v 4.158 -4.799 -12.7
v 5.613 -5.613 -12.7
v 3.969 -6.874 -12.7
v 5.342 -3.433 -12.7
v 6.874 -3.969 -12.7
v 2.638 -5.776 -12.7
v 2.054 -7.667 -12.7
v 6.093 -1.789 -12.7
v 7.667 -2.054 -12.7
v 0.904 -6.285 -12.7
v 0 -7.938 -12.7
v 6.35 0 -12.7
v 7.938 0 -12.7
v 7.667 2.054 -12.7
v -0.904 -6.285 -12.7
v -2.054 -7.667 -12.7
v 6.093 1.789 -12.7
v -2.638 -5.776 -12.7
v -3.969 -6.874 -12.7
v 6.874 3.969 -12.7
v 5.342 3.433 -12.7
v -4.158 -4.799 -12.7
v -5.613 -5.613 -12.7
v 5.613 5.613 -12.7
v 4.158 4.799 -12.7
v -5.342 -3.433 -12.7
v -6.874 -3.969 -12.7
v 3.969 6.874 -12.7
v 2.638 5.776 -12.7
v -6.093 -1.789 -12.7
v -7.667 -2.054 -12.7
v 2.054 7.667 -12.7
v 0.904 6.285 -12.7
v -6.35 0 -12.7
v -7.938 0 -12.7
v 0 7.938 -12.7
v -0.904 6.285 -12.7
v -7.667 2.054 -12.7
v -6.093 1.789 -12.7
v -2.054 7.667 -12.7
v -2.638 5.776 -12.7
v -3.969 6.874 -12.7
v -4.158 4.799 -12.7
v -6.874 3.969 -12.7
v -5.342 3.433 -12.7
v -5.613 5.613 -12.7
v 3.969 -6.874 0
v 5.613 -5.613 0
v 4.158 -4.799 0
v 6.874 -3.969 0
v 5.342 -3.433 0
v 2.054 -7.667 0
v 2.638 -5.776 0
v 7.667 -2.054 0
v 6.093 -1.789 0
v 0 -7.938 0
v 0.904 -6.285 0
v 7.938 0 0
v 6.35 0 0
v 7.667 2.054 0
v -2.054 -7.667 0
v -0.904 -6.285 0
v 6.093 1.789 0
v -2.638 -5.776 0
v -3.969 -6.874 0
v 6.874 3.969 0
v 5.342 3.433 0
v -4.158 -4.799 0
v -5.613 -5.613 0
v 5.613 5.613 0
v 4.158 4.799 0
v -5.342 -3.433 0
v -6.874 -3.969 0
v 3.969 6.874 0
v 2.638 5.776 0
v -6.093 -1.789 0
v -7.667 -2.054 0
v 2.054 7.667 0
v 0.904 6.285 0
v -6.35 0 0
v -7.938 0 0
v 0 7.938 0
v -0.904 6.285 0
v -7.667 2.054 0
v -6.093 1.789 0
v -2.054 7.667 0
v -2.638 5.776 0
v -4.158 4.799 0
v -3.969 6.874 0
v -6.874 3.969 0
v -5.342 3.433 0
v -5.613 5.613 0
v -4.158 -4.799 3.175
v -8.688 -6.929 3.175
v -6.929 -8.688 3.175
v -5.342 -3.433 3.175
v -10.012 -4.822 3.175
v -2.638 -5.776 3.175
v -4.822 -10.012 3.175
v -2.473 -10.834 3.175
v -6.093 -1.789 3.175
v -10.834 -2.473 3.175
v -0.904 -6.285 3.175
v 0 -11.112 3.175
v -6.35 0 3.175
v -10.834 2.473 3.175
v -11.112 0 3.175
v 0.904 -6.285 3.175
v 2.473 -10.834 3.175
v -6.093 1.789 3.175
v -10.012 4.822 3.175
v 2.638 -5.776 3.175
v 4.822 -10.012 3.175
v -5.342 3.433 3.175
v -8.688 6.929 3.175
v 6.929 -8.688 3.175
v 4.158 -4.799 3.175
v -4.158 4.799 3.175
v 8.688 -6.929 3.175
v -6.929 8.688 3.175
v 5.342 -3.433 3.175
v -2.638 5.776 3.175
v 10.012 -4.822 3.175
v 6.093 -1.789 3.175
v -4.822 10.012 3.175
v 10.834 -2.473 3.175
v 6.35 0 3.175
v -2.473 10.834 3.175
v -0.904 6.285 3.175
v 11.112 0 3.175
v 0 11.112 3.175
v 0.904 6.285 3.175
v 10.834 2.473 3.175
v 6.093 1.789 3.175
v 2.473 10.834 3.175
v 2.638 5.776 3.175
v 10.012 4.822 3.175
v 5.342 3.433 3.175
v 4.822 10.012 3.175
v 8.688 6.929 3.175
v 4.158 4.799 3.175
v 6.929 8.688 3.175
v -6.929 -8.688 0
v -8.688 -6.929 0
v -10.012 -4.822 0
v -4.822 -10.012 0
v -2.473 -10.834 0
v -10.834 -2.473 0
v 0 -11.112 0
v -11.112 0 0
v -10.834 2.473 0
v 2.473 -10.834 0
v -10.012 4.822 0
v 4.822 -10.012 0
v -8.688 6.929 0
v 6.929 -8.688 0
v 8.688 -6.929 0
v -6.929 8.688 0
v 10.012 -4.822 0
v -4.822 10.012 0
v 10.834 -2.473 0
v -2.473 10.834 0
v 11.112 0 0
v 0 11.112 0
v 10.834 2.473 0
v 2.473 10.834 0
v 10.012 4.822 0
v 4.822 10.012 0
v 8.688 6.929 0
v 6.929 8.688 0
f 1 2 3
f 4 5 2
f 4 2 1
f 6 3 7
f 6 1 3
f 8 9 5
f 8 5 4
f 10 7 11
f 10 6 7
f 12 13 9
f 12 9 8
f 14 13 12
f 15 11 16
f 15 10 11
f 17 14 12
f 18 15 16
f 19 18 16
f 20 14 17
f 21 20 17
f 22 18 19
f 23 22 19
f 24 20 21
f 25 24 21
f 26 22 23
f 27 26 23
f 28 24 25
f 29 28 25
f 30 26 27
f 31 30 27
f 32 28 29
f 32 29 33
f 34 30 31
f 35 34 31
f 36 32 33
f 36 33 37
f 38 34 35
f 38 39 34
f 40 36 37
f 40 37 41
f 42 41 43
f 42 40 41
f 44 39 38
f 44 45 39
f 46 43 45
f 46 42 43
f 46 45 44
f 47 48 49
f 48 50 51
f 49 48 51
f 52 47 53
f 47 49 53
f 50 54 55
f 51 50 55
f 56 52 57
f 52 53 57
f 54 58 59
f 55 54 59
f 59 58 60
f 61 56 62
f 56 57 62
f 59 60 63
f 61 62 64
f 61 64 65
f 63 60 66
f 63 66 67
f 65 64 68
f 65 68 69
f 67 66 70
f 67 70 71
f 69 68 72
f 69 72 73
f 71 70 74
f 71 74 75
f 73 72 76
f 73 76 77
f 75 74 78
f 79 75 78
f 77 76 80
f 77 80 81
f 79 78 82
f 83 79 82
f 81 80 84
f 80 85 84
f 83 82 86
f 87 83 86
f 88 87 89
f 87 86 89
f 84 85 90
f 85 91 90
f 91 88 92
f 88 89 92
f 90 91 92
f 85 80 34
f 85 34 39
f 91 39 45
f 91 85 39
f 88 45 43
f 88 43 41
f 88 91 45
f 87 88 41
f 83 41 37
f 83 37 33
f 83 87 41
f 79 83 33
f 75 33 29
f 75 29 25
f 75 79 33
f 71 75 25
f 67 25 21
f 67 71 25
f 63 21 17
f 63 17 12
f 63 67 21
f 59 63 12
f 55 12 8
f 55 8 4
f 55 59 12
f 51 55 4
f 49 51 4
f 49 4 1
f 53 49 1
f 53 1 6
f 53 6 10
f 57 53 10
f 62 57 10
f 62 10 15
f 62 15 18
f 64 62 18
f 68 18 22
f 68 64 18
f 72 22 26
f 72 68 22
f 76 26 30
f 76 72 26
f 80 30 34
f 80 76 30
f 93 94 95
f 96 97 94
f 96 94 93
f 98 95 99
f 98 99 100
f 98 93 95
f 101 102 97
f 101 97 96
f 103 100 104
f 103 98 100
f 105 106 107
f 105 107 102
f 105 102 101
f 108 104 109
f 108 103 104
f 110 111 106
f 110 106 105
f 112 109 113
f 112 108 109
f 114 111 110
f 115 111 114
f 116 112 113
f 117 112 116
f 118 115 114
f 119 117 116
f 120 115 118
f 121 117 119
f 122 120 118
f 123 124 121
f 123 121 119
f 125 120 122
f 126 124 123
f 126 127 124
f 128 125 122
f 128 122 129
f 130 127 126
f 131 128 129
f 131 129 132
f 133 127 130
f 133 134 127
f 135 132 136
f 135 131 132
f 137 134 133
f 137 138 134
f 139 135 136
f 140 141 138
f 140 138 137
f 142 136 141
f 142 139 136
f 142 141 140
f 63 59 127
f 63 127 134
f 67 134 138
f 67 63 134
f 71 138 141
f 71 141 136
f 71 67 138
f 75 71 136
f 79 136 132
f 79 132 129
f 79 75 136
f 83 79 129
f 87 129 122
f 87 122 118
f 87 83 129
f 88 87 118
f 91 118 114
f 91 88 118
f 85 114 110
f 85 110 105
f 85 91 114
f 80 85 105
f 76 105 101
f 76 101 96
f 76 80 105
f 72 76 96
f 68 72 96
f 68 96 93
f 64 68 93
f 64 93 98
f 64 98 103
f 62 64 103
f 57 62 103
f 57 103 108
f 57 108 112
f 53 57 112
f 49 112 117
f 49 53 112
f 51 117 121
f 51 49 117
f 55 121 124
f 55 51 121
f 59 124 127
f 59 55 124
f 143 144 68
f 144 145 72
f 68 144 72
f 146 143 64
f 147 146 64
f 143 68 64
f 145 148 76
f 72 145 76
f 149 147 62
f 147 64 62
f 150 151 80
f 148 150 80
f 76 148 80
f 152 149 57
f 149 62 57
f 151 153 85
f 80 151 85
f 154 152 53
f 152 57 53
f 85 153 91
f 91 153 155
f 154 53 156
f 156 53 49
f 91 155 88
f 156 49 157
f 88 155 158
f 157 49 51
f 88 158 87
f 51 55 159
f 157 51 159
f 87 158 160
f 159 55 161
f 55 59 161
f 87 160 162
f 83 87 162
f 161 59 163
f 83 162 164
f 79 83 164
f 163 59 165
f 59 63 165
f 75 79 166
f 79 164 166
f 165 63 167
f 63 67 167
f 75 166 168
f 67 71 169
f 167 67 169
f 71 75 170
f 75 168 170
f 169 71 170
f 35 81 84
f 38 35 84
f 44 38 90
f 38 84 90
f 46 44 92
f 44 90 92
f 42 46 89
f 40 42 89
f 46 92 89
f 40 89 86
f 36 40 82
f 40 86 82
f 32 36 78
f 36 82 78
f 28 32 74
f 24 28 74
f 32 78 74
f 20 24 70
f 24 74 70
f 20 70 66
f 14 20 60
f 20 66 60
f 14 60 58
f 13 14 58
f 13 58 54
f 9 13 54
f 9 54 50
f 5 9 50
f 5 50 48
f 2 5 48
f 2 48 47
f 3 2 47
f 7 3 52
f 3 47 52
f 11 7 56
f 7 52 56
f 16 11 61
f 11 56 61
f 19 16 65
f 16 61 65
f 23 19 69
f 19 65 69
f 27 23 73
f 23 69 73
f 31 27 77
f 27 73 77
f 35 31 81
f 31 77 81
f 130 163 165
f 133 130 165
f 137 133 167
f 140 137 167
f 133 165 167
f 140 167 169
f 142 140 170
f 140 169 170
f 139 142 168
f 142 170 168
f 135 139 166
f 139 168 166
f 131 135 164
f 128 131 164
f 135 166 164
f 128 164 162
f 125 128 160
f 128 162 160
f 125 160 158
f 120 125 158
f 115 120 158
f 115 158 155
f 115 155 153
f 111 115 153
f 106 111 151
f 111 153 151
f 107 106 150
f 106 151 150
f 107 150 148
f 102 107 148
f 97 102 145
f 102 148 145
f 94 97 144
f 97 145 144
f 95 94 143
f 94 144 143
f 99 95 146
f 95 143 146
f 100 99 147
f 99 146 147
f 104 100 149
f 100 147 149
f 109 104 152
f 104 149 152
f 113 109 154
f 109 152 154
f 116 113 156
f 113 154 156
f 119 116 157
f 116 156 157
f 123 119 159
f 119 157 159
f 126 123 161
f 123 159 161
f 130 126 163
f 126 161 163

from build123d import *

# Parameters (mm, degrees)
SKETCH1_R           = 11.1125
SKETCH1_R_2         = 6.35
BOSS_EXTRUDE1_DEPTH = 3.175
SKETCH2_R           = 7.9375
SKETCH2_R_2         = 6.35
BOSS_EXTRUDE2_DEPTH = 12.7


with BuildPart() as part:
    # Sketch1 → Boss-Extrude1 (new body)
    with BuildSketch(Plane.XY):
        Circle(SKETCH1_R)
        Circle(SKETCH1_R_2, mode=Mode.SUBTRACT)
    extrude(amount=BOSS_EXTRUDE1_DEPTH)


with BuildPart() as body_2:
    # Sketch2 → Boss-Extrude2 (new body)
    with BuildSketch(Plane(origin=(0, 0, 0), x_dir=(-1, 0, 0), z_dir=(0, 0, -1))):
        Circle(SKETCH2_R)
        Circle(SKETCH2_R_2, mode=Mode.SUBTRACT)
    extrude(amount=BOSS_EXTRUDE2_DEPTH)


solid = Compound([part.part, body_2.part])
